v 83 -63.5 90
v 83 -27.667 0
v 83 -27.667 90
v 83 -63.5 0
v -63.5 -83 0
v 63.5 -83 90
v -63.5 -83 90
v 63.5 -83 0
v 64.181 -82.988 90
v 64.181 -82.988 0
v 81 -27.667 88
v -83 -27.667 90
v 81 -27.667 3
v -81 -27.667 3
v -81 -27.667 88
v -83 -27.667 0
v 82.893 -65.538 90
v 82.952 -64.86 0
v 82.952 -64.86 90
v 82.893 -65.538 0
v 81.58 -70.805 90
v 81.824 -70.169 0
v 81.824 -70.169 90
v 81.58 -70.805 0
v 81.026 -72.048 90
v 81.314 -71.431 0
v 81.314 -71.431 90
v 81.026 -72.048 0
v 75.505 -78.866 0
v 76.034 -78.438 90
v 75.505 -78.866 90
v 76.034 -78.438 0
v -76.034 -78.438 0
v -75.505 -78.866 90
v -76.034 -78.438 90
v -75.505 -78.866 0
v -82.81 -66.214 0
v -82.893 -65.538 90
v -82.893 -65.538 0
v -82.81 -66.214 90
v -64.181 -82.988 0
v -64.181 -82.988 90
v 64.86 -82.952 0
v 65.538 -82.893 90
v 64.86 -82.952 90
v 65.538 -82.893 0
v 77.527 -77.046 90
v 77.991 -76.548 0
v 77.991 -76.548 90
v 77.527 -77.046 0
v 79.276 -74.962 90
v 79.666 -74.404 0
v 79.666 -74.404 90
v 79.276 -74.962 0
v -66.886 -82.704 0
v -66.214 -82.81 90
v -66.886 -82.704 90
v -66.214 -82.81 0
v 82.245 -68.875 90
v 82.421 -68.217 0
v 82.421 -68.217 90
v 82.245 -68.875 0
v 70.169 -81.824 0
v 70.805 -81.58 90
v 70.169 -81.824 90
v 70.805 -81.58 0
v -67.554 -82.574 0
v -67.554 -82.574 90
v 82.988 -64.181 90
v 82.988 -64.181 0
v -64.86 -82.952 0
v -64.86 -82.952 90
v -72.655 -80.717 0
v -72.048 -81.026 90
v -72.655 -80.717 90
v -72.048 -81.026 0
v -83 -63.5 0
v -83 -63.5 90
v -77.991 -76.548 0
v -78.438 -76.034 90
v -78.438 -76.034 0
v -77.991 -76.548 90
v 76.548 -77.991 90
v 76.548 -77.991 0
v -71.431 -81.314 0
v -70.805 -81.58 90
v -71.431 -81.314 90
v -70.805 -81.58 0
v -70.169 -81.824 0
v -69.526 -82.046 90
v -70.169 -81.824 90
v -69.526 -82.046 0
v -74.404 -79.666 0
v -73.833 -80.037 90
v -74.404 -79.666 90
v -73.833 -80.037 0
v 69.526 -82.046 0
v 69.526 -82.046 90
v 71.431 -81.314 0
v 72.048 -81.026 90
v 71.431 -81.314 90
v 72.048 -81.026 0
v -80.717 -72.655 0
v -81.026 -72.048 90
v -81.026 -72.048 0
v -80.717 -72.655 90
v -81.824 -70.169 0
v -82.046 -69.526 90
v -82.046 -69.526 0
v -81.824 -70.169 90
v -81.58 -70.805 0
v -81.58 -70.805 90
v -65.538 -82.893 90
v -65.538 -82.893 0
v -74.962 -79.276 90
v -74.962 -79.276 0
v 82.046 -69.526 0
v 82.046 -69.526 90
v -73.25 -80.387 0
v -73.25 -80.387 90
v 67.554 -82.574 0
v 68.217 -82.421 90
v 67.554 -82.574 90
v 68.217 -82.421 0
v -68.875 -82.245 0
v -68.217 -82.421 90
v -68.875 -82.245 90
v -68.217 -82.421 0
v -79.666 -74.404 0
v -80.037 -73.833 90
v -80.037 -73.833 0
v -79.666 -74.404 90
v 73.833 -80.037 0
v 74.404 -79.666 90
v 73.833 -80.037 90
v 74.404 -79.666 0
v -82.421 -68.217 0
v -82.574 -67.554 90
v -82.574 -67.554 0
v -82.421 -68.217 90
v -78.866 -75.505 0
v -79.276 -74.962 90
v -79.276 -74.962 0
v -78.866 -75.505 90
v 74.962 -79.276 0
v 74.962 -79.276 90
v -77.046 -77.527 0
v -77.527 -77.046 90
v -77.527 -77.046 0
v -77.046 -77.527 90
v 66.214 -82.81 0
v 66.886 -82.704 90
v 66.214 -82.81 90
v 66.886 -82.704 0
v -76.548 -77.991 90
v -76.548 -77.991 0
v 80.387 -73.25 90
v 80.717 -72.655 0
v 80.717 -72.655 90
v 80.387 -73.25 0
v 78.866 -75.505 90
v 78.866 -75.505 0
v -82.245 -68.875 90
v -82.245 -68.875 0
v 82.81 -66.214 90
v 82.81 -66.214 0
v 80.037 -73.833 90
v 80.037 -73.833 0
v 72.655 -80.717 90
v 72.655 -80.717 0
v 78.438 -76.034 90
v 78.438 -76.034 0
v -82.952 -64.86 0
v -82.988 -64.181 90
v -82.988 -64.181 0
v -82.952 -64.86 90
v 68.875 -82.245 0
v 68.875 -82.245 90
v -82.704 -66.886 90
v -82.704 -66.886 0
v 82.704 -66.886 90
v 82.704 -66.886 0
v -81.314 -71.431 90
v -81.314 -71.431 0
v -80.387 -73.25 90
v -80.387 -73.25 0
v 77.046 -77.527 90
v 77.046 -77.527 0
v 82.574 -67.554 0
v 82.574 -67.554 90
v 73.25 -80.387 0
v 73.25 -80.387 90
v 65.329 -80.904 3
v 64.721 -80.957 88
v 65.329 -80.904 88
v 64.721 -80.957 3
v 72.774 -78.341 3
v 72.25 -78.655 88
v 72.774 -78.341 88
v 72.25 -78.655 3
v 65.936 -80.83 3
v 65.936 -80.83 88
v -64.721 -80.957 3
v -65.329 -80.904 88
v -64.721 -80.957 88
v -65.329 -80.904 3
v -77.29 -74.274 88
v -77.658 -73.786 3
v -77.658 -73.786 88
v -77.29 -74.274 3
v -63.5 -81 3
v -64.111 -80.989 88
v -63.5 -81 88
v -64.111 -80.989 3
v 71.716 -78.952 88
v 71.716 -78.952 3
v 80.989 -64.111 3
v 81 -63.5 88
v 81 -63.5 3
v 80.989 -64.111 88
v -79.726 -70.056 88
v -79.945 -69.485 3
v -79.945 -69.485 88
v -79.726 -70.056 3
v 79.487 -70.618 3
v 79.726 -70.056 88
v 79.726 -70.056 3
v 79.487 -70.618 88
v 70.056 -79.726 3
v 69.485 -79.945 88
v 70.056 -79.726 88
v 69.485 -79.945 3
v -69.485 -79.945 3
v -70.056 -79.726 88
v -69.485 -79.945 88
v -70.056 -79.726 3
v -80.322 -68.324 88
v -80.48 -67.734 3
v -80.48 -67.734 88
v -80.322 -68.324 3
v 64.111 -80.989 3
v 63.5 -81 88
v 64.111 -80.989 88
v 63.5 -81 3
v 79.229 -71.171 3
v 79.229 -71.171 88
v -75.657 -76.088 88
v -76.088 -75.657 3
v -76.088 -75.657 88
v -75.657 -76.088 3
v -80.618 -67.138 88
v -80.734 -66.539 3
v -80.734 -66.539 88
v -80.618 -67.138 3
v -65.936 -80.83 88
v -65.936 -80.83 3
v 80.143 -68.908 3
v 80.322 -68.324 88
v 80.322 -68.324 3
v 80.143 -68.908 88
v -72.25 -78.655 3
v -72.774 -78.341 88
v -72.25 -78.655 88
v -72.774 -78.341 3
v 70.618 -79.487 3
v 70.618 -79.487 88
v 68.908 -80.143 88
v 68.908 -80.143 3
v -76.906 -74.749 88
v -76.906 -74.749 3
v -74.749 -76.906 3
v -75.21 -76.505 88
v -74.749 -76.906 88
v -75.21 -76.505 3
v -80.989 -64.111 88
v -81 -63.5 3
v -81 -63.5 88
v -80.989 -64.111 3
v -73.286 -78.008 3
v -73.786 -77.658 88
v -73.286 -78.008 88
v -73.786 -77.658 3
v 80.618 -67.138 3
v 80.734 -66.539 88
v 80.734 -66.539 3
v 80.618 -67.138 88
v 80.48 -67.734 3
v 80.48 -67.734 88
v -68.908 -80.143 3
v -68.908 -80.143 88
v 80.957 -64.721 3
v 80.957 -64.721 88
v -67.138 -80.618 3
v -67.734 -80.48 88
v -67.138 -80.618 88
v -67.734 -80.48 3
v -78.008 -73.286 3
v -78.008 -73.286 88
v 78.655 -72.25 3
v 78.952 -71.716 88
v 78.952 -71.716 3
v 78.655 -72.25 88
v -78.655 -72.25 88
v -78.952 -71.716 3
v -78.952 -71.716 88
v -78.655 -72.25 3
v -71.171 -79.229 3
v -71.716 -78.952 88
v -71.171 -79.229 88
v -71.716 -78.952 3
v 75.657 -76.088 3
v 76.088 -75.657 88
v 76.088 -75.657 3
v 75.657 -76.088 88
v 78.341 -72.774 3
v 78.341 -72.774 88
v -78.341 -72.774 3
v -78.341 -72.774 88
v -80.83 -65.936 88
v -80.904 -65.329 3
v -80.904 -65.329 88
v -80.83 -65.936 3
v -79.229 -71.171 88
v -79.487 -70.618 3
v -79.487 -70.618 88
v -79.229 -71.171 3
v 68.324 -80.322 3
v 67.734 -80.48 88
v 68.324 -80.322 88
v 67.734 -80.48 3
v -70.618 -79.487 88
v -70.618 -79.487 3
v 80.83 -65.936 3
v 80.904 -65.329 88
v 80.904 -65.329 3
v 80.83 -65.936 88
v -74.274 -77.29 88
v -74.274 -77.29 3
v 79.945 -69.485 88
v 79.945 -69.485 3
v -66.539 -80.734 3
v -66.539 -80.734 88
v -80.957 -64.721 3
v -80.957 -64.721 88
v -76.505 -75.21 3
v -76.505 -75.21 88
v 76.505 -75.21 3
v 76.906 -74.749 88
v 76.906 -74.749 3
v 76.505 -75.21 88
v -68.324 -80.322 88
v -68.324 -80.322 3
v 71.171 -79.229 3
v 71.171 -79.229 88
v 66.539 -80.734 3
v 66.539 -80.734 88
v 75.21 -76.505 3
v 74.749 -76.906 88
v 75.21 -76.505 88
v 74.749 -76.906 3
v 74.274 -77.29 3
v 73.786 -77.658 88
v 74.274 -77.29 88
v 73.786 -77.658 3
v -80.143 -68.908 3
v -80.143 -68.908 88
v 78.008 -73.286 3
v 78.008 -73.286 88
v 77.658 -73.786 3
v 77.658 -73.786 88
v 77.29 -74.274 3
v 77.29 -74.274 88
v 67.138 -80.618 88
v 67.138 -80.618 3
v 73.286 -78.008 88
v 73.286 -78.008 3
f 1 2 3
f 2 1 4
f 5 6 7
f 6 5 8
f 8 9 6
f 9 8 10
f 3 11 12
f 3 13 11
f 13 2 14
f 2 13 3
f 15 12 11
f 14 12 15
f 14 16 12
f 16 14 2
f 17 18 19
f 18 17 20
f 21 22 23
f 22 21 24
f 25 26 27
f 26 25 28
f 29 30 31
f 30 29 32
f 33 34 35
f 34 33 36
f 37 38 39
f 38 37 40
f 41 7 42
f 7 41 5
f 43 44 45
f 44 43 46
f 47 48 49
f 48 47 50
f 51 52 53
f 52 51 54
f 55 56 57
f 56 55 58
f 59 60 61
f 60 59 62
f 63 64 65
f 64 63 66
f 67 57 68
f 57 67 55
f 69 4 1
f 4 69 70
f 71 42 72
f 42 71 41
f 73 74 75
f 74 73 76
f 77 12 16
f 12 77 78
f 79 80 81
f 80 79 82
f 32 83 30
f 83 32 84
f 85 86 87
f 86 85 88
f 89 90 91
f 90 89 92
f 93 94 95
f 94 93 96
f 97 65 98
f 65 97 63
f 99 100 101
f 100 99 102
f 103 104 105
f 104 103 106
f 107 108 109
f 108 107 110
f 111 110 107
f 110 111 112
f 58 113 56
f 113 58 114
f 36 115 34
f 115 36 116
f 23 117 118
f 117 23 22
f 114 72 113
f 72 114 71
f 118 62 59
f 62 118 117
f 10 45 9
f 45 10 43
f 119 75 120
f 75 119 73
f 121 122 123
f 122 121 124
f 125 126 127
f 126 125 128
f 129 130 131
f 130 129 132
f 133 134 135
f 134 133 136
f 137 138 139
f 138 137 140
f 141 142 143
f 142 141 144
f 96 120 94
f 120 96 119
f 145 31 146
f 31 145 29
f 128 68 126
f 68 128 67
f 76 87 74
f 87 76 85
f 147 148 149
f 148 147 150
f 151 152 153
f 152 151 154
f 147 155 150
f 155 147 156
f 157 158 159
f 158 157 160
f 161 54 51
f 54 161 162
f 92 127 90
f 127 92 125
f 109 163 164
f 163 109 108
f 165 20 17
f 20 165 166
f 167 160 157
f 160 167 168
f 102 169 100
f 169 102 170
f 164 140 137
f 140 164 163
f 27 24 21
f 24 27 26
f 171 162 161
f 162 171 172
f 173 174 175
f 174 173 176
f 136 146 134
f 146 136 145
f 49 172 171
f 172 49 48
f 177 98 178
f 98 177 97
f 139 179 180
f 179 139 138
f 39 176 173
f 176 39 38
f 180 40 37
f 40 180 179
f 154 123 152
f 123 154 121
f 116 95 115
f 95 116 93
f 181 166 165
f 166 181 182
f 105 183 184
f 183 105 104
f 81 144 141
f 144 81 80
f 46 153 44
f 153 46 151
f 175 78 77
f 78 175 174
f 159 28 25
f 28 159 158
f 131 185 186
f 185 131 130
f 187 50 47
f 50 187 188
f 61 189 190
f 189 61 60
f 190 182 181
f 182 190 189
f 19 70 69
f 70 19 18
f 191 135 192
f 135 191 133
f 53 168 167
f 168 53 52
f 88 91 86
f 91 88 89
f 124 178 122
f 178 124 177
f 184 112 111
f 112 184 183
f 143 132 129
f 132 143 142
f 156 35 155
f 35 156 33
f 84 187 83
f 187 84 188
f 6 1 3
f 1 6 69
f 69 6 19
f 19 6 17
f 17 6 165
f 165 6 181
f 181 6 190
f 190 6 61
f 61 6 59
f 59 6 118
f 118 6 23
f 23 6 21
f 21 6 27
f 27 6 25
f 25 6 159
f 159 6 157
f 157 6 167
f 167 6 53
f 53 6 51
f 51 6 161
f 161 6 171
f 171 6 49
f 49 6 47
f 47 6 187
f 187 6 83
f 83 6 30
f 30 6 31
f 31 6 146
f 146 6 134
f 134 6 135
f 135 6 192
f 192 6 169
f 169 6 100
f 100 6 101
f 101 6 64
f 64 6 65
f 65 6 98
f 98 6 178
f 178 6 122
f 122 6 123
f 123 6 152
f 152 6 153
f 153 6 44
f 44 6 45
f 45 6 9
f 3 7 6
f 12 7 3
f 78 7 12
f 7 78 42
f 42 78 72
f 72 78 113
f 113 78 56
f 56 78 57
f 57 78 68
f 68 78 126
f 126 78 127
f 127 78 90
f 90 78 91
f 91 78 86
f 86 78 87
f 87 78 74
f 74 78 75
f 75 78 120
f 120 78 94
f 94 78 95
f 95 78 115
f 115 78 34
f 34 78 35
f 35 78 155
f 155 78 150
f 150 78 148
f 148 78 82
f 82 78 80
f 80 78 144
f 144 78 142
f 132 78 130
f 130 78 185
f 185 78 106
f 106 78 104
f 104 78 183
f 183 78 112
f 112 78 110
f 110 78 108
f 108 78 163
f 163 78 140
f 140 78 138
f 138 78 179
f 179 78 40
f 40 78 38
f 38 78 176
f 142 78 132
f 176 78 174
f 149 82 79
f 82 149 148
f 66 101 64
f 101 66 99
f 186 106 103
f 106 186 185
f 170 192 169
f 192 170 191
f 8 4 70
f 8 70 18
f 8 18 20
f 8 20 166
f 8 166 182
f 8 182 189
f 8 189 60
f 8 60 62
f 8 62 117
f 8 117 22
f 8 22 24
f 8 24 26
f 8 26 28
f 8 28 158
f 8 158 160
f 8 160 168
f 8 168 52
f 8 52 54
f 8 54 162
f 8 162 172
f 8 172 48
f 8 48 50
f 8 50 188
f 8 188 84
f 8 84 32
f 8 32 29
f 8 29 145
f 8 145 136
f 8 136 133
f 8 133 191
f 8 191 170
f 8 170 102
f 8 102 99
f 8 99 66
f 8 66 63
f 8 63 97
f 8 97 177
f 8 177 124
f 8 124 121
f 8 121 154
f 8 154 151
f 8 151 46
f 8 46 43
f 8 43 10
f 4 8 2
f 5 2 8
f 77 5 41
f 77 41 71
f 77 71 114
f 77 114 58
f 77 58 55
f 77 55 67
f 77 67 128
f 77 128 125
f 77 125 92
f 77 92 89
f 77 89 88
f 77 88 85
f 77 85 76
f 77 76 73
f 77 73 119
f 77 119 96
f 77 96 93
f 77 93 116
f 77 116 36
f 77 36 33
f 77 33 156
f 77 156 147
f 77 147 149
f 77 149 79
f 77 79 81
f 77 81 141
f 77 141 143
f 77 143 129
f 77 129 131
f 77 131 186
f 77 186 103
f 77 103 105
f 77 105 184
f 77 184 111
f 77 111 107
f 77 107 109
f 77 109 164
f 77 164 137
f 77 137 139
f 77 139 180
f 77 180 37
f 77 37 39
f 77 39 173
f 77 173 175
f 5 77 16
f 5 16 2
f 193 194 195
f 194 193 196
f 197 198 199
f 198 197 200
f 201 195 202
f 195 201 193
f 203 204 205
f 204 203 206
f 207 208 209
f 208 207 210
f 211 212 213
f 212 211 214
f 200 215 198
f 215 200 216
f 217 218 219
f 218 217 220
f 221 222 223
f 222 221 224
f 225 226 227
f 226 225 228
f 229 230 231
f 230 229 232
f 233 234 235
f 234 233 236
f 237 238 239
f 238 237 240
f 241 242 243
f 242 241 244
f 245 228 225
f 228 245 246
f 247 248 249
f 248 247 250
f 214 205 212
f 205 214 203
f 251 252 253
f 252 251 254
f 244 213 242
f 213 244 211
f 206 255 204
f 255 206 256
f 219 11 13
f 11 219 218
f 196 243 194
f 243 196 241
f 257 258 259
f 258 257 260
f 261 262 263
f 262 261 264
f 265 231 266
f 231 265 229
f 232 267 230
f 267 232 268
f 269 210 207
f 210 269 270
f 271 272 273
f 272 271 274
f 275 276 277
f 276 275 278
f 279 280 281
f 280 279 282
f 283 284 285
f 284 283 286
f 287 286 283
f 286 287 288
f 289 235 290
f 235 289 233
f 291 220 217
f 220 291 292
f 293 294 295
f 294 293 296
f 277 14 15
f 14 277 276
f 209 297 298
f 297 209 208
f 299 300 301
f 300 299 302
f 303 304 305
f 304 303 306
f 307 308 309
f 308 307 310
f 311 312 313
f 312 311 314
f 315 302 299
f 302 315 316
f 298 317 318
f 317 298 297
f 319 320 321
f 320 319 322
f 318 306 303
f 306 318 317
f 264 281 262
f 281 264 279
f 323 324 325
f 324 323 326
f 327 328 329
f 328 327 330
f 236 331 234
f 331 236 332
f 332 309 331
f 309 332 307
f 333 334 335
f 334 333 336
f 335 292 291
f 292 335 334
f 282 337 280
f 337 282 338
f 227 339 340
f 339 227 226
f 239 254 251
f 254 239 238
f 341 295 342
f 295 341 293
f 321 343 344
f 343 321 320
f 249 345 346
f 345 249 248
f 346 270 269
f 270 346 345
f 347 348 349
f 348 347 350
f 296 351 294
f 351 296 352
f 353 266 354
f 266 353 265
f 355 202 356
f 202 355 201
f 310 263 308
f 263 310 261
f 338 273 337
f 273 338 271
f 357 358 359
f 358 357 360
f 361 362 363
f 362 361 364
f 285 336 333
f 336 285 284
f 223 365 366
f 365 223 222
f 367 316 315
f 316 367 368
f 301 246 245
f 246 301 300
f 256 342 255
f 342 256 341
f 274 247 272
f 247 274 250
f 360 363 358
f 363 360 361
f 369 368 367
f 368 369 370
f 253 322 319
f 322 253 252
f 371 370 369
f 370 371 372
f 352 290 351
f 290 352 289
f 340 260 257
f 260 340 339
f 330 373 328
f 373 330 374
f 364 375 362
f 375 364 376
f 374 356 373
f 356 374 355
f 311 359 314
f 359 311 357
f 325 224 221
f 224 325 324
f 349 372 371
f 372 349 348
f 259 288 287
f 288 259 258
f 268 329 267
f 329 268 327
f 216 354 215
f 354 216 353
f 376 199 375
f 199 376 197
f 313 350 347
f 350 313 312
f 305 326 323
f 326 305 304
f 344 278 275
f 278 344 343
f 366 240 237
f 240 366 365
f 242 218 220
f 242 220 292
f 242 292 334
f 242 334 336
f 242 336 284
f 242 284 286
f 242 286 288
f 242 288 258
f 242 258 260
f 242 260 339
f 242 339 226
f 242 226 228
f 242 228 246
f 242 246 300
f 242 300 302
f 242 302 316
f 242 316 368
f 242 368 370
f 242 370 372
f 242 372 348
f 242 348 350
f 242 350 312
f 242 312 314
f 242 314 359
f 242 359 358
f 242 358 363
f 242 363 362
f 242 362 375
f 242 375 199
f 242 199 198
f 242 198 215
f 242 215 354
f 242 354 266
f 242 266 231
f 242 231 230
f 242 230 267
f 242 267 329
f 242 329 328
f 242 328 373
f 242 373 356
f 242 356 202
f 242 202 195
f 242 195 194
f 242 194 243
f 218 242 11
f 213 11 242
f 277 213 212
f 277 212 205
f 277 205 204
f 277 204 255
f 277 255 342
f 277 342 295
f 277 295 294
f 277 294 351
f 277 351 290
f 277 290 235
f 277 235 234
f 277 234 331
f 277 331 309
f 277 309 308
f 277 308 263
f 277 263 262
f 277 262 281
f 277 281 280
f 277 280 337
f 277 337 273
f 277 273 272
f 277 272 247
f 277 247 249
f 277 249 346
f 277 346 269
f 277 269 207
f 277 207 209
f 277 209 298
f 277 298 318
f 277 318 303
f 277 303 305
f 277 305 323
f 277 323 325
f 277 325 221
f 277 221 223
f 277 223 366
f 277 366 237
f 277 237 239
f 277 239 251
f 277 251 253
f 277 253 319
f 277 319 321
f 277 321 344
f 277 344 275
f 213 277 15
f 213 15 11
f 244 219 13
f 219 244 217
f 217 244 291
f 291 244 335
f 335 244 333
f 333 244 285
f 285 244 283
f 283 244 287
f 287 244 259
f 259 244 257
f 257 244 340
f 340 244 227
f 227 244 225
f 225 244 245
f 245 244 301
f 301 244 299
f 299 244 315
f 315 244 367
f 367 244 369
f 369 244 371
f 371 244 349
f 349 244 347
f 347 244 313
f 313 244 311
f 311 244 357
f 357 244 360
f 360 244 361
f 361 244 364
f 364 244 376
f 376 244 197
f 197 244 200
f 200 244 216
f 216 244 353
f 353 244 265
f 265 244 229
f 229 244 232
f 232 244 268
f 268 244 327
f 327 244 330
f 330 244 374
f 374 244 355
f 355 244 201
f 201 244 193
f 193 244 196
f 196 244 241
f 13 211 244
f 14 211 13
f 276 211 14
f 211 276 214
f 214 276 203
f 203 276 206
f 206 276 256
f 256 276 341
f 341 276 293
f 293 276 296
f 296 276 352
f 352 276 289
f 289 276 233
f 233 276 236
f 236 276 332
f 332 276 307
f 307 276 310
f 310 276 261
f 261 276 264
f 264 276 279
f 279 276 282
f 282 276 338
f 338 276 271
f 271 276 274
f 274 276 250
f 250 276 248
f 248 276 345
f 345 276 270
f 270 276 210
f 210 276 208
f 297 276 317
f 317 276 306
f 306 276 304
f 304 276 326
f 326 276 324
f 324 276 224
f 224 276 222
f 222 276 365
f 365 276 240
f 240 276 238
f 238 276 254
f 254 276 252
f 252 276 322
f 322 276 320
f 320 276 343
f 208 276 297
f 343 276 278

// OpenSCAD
// Shelf Bin/Drawer
// A shallow drawer that slides into the shelf opening along the depth axis.
// Sits at the bottom of the shelf opening; open top lets items peek out.
// Left/right sides follow the shelf's inner curved profile at the bottom.
// Units: millimeters

// --- Shelf Parameters (must match shelf.scad) ---
width  = 175;
height = 175;
depth  = 90;
wall   = 4;
radius = 20;

// --- Bin Parameters ---
bin_wall        = 2;    // wall/floor thickness (left, right, back)
face_thickness  = 3;    // front wall thickness (thicker for future texture)
clearance       = 0.5;  // gap per side so bin slides in/out smoothly
height_fraction = 1/3;  // bin height as fraction of shelf opening height

$fn = 180;

// --- Derived Dimensions ---
opening_width  = width - 2 * wall;
opening_height = height - 2 * wall;

bin_width       = opening_width - 2 * clearance;
bin_full_height = opening_height - 2 * clearance;
bin_radius      = radius - clearance;
bin_height      = bin_full_height * height_fraction;

// A centered rounded rectangle in 2D
module rounded_rect(w, h, r) {
    offset(r = r)
        square([w - 2 * r, h - 2 * r], center = true);
}

// 2D outer profile: bottom portion of the shelf's inner rounded rect
module bin_profile() {
    intersection() {
        rounded_rect(bin_width, bin_full_height, bin_radius);
        translate([0, -(bin_full_height - bin_height) / 2])
            square([bin_width + 1, bin_height], center = true);
    }
}

// Complete bin: single solid piece with floor, 4 walls, open top
module bin() {
    difference() {
        // Outer solid — full shelf depth
        linear_extrude(height = depth)
            bin_profile();

        // Inner void — leaves front wall (face_thickness) and back wall (bin_wall)
        translate([0, 0, face_thickness])
            linear_extrude(height = depth - face_thickness - bin_wall)
                rounded_rect(bin_width - 2 * bin_wall, bin_full_height - 2 * bin_wall, bin_radius - bin_wall);
    }
}

bin();
